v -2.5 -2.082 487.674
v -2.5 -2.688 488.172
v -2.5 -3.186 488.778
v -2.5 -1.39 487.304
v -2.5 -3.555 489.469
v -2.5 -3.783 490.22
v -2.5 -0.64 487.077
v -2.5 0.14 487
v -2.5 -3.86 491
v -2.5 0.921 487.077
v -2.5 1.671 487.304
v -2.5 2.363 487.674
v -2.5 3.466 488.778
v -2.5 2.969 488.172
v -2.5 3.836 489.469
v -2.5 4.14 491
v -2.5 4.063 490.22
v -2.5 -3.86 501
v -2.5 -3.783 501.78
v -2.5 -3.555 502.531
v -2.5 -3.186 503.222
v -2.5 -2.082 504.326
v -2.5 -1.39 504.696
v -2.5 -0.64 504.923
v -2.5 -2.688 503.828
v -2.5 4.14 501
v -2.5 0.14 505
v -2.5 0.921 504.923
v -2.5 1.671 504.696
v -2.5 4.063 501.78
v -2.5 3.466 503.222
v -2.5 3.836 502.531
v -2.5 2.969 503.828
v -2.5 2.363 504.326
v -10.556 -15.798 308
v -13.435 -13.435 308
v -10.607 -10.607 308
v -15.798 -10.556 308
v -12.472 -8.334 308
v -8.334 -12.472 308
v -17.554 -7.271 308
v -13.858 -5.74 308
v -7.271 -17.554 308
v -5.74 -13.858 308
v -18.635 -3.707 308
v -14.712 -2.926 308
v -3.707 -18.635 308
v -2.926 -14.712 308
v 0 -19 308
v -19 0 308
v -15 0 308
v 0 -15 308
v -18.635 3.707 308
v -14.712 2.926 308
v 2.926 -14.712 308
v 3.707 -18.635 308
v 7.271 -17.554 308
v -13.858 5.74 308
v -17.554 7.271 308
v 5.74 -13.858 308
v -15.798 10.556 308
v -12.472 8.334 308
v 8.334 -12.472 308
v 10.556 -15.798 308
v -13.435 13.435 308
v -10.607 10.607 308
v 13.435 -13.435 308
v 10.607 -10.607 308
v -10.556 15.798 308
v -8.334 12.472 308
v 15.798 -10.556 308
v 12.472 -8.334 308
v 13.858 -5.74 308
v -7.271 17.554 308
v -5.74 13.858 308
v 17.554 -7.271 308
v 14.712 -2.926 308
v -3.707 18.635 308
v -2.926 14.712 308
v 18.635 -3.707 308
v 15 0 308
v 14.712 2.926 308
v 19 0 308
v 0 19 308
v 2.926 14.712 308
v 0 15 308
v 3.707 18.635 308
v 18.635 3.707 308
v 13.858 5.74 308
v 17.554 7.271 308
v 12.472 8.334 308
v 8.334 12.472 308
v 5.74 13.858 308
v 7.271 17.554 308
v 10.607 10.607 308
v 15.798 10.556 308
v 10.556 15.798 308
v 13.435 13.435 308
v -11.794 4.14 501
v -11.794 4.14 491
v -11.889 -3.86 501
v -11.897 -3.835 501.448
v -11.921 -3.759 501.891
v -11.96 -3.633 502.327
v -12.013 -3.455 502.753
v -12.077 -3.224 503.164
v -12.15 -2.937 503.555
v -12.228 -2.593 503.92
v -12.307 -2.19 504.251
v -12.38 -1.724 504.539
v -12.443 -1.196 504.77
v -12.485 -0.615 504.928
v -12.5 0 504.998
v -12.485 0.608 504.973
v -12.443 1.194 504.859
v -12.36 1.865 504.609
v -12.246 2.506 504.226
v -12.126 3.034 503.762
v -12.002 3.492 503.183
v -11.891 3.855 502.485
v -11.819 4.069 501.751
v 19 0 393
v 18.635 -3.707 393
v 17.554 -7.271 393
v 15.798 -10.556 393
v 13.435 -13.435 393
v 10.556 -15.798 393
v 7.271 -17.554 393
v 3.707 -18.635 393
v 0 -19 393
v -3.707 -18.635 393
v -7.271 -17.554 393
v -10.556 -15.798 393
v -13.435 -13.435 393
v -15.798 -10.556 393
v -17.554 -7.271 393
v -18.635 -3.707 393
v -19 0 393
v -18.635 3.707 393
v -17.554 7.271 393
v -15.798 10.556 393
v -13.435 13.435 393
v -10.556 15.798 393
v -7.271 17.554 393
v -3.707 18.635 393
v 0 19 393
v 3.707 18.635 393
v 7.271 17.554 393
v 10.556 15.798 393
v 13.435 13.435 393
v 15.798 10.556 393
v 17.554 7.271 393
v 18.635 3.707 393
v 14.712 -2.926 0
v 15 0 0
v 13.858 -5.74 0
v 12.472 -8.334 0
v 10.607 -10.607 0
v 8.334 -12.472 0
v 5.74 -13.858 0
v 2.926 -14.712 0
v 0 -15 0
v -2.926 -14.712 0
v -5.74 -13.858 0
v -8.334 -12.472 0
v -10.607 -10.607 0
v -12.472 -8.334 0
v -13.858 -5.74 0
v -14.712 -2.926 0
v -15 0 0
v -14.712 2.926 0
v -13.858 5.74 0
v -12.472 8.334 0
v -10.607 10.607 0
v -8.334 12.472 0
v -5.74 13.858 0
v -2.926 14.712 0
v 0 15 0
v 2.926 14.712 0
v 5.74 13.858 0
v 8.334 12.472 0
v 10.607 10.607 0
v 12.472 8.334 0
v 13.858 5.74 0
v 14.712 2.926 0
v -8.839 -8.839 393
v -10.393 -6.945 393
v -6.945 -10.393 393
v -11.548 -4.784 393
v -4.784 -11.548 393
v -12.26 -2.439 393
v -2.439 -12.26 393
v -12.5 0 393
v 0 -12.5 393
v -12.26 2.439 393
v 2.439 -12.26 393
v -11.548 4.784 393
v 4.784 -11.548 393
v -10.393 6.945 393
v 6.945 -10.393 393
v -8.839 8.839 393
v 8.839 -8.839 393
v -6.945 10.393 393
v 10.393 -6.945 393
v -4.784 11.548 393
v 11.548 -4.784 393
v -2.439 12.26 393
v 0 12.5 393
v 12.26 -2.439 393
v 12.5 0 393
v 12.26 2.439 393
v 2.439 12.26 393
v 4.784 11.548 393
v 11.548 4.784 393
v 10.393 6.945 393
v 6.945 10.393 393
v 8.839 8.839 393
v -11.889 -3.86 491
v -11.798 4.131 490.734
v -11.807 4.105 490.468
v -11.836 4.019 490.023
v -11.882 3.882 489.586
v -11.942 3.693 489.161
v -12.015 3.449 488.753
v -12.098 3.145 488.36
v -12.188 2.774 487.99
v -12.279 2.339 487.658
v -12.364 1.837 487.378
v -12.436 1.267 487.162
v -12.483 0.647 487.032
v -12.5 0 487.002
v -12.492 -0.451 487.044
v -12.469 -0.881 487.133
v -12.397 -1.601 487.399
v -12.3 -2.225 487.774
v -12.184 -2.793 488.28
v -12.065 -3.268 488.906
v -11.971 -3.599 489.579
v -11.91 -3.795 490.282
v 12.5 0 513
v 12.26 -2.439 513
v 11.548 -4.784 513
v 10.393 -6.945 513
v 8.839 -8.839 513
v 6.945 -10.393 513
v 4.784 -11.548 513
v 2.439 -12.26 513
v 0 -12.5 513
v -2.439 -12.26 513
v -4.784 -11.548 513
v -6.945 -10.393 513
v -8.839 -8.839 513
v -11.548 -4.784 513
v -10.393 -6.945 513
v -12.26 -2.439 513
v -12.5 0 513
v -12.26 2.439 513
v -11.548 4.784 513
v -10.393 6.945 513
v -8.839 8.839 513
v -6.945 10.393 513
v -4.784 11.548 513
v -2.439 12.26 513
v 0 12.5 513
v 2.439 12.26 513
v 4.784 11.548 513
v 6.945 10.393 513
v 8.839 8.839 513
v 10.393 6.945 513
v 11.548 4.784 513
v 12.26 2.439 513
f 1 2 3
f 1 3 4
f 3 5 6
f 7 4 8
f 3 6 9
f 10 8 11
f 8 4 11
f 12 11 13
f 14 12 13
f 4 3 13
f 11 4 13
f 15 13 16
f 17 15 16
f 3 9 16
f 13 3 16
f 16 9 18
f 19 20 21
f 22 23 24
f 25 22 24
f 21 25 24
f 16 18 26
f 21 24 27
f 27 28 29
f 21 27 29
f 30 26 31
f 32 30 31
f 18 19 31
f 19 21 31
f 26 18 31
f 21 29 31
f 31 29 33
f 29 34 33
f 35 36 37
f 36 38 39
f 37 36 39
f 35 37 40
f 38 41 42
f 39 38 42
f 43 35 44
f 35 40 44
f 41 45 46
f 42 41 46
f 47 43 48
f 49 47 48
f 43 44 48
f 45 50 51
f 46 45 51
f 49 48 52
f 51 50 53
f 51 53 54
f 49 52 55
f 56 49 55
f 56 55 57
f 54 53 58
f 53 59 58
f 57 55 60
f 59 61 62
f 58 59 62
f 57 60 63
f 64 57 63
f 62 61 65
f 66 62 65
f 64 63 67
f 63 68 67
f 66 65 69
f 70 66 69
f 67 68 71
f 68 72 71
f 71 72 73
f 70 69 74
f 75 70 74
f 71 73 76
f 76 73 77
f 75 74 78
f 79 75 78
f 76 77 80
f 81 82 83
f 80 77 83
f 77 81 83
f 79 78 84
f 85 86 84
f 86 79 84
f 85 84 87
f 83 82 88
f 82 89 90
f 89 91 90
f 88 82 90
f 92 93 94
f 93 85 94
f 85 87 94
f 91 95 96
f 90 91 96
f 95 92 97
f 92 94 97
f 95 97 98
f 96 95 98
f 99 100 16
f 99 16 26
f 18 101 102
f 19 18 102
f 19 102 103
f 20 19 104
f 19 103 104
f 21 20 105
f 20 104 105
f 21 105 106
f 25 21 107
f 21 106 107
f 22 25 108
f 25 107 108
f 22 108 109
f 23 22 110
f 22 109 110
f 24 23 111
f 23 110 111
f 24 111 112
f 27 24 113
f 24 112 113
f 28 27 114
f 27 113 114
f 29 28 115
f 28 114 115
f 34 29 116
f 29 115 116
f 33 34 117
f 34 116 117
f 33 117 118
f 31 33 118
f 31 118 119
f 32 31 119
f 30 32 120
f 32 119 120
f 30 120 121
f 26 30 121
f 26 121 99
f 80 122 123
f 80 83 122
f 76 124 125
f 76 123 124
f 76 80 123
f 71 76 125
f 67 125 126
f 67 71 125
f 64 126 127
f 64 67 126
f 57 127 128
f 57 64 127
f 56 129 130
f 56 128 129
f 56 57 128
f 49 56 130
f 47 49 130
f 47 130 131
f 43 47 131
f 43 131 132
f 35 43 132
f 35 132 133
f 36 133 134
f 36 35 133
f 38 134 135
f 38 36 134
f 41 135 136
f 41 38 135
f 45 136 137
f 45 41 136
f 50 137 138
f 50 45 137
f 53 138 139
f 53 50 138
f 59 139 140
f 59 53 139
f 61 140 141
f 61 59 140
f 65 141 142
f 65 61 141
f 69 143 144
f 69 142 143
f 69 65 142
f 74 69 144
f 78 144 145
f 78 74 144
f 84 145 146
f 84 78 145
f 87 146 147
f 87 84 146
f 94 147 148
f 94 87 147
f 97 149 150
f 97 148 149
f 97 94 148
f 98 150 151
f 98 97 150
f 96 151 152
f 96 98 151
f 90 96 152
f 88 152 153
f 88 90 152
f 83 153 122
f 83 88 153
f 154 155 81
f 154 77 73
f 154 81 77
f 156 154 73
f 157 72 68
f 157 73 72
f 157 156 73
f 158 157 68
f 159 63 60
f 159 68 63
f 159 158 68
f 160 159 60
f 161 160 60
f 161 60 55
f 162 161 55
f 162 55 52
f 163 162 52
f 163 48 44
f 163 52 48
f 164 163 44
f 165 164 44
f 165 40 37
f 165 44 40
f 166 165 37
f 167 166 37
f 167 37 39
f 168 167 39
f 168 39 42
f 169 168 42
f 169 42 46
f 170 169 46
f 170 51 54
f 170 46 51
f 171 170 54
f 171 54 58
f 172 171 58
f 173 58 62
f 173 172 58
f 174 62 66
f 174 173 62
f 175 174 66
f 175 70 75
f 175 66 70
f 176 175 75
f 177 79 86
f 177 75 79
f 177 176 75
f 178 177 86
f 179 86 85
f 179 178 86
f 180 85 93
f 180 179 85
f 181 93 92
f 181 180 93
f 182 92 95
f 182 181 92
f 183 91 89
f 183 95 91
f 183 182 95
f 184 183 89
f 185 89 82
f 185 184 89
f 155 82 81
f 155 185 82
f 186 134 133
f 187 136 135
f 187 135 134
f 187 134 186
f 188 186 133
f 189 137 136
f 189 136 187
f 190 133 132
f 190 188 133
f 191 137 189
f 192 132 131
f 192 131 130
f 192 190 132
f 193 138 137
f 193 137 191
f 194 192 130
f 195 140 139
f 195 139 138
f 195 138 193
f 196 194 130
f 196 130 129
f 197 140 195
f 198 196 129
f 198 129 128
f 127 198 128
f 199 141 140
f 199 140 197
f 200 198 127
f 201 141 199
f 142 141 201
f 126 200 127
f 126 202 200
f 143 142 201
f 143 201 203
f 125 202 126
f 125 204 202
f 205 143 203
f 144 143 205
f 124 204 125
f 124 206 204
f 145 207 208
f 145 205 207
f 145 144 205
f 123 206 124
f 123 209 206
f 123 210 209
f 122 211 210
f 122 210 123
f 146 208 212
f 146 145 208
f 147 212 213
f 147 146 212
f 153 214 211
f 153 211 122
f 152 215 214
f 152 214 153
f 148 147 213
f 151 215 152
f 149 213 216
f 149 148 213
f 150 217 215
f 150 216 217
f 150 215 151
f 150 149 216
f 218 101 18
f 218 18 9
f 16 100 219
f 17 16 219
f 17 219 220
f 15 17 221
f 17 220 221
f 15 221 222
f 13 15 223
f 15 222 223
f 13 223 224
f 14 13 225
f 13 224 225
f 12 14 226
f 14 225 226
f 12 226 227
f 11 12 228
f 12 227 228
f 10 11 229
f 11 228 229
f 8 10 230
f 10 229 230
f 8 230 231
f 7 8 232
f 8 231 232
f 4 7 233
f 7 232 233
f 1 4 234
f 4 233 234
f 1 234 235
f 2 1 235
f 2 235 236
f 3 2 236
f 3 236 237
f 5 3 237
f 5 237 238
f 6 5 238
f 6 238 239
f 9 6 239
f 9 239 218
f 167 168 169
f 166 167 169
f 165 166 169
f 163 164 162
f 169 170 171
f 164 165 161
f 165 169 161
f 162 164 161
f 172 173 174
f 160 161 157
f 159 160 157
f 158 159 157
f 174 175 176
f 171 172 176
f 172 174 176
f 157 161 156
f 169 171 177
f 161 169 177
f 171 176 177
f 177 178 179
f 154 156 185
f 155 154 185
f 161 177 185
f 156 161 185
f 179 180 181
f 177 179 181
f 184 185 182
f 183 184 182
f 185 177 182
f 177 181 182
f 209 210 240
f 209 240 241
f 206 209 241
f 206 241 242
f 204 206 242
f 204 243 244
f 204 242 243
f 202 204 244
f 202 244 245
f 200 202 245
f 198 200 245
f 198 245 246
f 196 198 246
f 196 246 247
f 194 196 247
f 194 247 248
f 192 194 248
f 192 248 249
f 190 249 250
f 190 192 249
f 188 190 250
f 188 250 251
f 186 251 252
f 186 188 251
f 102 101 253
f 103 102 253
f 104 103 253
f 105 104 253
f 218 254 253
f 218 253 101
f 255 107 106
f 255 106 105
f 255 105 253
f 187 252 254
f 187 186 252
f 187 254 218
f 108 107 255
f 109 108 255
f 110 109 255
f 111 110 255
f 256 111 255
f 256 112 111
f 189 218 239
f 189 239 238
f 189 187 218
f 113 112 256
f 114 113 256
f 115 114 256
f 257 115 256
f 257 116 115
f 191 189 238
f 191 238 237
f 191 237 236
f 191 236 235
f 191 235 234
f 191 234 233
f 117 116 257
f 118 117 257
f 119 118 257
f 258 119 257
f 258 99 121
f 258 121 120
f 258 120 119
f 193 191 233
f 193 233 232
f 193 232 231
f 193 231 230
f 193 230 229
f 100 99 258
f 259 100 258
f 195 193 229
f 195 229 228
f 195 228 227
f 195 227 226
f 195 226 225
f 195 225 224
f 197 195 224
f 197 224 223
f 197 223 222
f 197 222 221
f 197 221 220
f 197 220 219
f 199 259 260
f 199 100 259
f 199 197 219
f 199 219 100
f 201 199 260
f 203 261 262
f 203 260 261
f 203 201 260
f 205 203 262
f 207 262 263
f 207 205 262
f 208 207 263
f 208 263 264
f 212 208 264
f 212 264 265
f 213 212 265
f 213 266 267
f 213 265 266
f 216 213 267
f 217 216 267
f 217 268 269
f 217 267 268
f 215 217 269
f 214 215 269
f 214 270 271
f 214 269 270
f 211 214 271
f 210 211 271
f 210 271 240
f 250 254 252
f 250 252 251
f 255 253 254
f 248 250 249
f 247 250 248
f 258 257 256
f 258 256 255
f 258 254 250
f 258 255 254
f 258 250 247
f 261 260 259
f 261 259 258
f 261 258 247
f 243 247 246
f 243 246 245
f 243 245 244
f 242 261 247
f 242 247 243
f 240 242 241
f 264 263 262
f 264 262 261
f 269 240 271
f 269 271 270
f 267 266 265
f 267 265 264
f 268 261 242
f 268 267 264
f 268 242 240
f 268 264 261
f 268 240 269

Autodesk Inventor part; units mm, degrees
ref_plane "XZ Plane" through (0, 0, 0) normal (0, 1, 0) x (-1, 0, 0)
ref_plane "XY Plane" through (0, 0, 0) normal (0, 0, 1) x (1, 0, 0)
sketch "Sketch2" plane through (0, 0, 0) normal (0, 1, 0) x (-1, 0, 0)
  line L0 (0, 0) -> (0, 513)
  line L1 (0, 513) -> (-12.5, 513)
  line L2 (-12.5, 513) -> (-12.5, 393)
  line L3 (-19, 393) -> (-19, 308)
  line L4 (-19, 308) -> (-15, 308)
  line L5 (-15, 308) -> (-15, 0)
  line L6 (-15, 0) -> (0, 0)
  line L7 (-19, 393) -> (-12.5, 393)
  dimension "d6" = 30
  dimension "d11" = 308
  dimension "d12" = 85
  dimension "d13" = 120
  dimension "d14" = 38
  dimension "d15" = 25
revolve "Revolution1" add sketch "Sketch2" angle 360 about axis through (0, 0, 0) along (0, 0, 1)
ref_plane "Work Plane1" through (-12.5, 0, 453) normal (1, 0, 0) x (0, 1, 0)
sketch "Sketch3" plane through (-12.5, 0, 453) normal (1, 0, 0) x (0, 1, 0)
  line L0 (12.5, -60) -> (-12.5, -60) projected
  line L1 (12.5, 60) -> (-12.5, 60) projected
  line L2 (0.1403, 48) -> (0.1403, 38) construction
  line L3 (-3.8597, 48) -> (-3.8597, 38)
  line L4 (4.1403, 38) -> (4.1403, 48)
  arc A0 (4.1403, 48) -> (-3.8597, 48) centre (0.1403, 48) ccw
  arc A1 (-3.8597, 38) -> (4.1403, 38) centre (0.1403, 38) ccw
  point P0 (0, -453)
  point P1 (0.1403, 43)
  dimension "d8" = 12
  dimension "d9" = 8
  dimension "d10" = 10
extrude "Extrusion2" cut sketch "Sketch3" along normal blind 10
properties part number "NVPH-312 augur shaft"
